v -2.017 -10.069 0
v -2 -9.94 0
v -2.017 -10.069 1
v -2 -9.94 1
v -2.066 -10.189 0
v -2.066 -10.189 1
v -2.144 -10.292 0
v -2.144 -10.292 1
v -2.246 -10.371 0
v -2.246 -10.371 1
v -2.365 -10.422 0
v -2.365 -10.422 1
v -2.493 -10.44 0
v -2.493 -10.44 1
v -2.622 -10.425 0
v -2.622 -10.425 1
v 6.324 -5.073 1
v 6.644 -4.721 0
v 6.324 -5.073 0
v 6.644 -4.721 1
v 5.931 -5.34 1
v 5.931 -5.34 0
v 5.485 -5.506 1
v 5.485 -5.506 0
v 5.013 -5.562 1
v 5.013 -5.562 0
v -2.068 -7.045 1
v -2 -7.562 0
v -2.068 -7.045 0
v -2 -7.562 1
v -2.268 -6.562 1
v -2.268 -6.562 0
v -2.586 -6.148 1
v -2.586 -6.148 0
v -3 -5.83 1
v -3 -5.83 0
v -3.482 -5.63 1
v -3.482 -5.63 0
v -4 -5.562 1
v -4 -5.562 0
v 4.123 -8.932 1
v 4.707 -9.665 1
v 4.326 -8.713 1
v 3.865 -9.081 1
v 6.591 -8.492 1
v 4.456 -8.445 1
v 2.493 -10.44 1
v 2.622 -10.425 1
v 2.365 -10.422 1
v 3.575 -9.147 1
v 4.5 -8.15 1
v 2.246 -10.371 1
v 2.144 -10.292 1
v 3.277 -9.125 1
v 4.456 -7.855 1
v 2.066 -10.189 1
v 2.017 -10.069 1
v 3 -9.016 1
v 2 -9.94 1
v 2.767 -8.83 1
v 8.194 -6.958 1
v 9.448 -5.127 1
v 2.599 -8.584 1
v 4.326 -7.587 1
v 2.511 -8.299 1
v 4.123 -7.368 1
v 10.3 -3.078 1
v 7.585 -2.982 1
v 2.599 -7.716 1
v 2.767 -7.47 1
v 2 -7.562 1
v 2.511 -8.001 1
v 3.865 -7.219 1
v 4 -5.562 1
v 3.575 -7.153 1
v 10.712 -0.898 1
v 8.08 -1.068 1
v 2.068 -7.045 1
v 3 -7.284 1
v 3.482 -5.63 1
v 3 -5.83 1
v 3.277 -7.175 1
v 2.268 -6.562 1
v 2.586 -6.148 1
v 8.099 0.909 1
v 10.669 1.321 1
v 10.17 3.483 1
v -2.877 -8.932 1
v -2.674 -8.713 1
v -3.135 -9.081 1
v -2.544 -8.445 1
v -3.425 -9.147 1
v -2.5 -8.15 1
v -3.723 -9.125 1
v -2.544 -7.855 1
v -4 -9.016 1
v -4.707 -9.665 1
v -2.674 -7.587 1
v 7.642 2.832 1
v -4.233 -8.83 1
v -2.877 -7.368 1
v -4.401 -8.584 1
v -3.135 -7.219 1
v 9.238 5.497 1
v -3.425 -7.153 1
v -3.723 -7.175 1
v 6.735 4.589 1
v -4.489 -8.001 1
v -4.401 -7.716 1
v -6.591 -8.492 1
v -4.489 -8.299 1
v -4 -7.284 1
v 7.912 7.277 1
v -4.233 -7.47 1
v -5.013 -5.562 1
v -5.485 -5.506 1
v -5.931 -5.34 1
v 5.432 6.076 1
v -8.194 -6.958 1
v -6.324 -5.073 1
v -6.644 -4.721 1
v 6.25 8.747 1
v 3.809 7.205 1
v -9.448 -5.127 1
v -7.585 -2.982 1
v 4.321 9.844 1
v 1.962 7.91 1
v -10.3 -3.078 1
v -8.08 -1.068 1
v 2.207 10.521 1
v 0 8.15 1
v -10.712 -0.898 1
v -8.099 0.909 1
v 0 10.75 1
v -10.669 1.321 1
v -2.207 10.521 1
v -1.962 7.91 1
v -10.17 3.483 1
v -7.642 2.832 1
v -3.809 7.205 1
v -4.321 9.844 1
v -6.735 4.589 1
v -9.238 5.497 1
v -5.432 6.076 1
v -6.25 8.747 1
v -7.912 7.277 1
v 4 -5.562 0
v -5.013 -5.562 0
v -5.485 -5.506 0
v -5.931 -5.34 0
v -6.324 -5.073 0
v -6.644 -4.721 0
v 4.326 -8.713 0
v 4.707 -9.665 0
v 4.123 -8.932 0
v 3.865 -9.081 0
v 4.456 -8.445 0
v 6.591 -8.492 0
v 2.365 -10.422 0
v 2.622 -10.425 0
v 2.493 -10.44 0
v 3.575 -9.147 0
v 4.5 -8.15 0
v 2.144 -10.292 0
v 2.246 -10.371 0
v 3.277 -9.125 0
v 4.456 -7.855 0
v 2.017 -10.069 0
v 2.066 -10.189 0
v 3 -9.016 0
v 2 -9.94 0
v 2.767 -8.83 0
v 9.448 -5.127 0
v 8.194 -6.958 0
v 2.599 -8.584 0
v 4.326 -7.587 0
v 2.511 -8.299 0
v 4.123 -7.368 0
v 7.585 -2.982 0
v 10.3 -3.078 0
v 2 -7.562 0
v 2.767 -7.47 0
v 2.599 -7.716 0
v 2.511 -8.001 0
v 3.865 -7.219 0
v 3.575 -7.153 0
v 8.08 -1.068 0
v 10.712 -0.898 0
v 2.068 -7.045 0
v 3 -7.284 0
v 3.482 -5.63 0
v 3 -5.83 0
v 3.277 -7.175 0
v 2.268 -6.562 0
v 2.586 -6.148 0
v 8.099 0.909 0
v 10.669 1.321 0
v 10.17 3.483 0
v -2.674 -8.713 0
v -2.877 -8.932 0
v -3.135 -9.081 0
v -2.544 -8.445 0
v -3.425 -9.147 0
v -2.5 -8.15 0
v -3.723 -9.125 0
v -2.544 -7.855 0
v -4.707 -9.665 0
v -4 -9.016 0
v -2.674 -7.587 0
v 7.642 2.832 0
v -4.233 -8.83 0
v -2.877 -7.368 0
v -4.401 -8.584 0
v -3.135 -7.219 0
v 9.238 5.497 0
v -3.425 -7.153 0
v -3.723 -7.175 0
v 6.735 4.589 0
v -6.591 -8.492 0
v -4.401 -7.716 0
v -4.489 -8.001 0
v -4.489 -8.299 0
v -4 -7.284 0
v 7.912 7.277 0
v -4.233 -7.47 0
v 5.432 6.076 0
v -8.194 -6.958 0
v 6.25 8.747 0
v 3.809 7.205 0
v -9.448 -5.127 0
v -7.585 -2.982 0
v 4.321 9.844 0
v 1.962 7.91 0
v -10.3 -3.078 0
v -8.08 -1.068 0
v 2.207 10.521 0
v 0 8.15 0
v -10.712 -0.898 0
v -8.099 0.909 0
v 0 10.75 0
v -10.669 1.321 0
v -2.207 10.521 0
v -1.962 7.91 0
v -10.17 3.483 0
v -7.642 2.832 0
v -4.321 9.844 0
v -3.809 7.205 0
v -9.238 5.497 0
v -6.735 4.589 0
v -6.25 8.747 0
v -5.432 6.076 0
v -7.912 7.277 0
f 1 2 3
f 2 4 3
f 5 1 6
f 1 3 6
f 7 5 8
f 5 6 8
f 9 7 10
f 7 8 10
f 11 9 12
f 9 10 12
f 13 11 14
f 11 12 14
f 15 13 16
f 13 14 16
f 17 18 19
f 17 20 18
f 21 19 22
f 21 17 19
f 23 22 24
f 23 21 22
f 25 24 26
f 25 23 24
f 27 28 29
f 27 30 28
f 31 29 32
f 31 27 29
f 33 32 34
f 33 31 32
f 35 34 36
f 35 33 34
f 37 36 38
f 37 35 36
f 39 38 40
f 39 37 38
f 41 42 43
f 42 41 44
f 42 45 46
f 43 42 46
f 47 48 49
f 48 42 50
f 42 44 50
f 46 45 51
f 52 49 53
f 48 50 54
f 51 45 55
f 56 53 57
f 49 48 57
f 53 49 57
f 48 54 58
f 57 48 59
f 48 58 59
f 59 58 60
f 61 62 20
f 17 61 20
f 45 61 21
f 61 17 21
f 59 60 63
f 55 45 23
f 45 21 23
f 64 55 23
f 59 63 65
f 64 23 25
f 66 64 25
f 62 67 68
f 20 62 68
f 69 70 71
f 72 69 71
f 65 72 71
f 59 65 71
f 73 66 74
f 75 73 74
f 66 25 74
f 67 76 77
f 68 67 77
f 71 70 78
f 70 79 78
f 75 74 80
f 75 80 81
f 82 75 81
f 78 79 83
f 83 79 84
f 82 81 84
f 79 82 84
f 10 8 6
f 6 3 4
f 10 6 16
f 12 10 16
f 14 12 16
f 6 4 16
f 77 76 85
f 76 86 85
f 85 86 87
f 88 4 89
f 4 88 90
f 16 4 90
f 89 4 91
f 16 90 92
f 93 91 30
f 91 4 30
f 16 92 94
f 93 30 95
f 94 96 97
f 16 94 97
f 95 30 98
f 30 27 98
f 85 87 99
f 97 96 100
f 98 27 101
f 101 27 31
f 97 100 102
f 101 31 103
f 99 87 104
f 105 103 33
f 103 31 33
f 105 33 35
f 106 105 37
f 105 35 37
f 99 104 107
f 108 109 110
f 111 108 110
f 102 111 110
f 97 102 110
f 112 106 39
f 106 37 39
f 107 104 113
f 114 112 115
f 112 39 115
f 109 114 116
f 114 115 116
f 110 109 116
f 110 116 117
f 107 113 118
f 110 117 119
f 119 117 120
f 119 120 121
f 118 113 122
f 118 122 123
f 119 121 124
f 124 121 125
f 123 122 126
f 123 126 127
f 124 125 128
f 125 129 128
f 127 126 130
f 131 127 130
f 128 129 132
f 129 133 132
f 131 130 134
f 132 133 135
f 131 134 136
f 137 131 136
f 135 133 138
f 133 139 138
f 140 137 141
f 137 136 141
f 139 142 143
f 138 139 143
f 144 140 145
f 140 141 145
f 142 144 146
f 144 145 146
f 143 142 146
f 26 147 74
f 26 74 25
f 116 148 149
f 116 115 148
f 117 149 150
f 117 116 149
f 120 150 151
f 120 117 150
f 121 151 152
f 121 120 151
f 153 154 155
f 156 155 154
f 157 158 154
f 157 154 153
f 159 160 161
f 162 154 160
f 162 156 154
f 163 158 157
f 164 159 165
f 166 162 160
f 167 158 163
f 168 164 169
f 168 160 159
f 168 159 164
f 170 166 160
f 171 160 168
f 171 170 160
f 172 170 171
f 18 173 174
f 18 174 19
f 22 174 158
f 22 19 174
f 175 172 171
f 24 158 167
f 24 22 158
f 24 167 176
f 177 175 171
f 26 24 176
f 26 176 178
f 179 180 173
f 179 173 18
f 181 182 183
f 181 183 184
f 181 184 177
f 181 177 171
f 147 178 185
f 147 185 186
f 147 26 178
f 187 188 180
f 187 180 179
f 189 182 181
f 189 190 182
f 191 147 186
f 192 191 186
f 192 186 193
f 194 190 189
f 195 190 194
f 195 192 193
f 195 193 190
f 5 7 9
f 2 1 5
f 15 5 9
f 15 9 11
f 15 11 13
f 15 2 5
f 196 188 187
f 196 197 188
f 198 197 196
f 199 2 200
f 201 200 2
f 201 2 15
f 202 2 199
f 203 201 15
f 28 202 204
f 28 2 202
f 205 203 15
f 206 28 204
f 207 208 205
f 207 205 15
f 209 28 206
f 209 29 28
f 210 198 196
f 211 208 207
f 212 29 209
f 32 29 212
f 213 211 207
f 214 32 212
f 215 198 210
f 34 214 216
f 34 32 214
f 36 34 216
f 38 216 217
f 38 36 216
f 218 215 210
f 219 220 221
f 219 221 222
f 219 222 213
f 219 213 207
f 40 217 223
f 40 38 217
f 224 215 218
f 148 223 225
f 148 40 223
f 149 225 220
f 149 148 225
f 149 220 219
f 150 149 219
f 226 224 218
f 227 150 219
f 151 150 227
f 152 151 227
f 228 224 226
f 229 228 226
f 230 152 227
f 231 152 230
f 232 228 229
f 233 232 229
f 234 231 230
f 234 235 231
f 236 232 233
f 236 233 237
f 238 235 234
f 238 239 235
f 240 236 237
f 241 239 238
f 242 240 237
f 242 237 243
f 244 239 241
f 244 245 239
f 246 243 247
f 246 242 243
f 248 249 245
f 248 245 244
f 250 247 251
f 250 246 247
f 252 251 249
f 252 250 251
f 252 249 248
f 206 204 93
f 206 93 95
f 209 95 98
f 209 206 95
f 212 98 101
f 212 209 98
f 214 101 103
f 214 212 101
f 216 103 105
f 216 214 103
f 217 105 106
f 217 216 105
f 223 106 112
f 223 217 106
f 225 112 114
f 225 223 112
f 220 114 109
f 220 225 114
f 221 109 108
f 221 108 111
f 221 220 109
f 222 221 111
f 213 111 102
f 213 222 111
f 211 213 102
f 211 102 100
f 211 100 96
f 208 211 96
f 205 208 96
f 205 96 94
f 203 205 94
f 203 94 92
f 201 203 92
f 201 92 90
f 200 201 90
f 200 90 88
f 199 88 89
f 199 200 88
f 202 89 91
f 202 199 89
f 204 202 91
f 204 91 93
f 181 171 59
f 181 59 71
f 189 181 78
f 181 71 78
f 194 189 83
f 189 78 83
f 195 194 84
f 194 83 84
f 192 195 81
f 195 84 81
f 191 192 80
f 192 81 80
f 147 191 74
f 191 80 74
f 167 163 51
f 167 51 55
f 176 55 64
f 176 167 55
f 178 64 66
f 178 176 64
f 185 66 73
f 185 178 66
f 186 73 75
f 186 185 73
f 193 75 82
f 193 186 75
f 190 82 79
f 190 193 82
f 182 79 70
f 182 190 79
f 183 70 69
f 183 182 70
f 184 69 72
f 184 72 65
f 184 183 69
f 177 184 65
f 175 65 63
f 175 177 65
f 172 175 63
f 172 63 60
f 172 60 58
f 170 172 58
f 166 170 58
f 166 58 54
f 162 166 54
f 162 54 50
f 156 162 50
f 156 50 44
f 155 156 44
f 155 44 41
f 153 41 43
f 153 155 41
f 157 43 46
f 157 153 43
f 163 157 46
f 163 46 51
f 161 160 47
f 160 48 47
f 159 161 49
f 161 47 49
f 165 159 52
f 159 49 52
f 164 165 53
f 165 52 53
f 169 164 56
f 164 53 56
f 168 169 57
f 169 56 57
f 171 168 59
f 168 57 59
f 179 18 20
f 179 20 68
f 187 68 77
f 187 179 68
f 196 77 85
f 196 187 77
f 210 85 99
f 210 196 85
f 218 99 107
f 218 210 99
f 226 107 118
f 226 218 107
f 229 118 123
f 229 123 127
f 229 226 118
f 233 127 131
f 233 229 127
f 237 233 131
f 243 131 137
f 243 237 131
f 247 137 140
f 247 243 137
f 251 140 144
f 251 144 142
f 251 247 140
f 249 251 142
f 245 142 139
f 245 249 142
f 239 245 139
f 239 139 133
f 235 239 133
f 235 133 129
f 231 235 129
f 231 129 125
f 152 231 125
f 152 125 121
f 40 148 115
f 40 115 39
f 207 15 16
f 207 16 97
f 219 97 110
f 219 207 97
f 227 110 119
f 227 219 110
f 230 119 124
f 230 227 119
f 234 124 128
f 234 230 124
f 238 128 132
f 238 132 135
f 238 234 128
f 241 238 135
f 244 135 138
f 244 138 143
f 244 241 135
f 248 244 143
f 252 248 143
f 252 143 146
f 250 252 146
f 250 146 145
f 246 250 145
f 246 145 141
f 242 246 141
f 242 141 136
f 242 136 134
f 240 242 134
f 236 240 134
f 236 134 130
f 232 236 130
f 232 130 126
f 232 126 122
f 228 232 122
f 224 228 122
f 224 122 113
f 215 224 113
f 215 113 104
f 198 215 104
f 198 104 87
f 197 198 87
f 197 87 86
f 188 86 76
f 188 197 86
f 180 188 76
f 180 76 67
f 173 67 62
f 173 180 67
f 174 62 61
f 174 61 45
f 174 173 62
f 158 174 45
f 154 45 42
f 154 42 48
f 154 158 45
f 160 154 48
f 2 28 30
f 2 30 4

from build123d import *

# Parameters (mm, degrees)
IZIM1_R                     = 1
Y_KSEKLIK_EKSTR_ZYON1_DEPTH = 1
RADYUS1_R                   = 2
RADYUS2_R                   = 0.5


with BuildPart() as part:
    # Çizim1 → Yükseklik-Ekstrüzyon1 (new body)
    with BuildSketch(Plane.XY):
        with BuildLine():
            Line((-2, -5.562315087), (-2, -10.562315087))
            ThreePointArc((-2, -10.562315087), (0, 10.75), (2, -10.562315087))
            Line((2, -10.562315087), (2, -5.562315087))
            Line((2, -5.562315087), (5.956773529, -5.562315087))
            ThreePointArc((5.956773529, -5.562315087), (0, 8.15), (-5.956773529, -5.562315087))
            Line((-5.956773529, -5.562315087), (-2, -5.562315087))
        make_face()
        with Locations((-3.5, -8.15)):
            Circle(IZIM1_R, mode=Mode.SUBTRACT)
        with Locations((3.5, -8.15)):
            Circle(IZIM1_R, mode=Mode.SUBTRACT)
    extrude(amount=Y_KSEKLIK_EKSTR_ZYON1_DEPTH)

    # Radyus1
    radyus1_edges = [part.edges().sort_by_distance(p)[0] for p in [
        (-2, -5.562315087, 0.5),
        (2, -5.562315087, 0.5),
        (5.956773529, -5.562315087, 0.5),
        (-5.956773529, -5.562315087, 0.5),
    ]]
    fillet(radyus1_edges, radius=RADYUS1_R)

    # Radyus2
    radyus2_edges = [part.edges().sort_by_distance(p)[0] for p in [
        (-2, -10.562315087, 0.5),
        (2, -10.562315087, 0.5),
    ]]
    fillet(radyus2_edges, radius=RADYUS2_R)


solid = part.part
